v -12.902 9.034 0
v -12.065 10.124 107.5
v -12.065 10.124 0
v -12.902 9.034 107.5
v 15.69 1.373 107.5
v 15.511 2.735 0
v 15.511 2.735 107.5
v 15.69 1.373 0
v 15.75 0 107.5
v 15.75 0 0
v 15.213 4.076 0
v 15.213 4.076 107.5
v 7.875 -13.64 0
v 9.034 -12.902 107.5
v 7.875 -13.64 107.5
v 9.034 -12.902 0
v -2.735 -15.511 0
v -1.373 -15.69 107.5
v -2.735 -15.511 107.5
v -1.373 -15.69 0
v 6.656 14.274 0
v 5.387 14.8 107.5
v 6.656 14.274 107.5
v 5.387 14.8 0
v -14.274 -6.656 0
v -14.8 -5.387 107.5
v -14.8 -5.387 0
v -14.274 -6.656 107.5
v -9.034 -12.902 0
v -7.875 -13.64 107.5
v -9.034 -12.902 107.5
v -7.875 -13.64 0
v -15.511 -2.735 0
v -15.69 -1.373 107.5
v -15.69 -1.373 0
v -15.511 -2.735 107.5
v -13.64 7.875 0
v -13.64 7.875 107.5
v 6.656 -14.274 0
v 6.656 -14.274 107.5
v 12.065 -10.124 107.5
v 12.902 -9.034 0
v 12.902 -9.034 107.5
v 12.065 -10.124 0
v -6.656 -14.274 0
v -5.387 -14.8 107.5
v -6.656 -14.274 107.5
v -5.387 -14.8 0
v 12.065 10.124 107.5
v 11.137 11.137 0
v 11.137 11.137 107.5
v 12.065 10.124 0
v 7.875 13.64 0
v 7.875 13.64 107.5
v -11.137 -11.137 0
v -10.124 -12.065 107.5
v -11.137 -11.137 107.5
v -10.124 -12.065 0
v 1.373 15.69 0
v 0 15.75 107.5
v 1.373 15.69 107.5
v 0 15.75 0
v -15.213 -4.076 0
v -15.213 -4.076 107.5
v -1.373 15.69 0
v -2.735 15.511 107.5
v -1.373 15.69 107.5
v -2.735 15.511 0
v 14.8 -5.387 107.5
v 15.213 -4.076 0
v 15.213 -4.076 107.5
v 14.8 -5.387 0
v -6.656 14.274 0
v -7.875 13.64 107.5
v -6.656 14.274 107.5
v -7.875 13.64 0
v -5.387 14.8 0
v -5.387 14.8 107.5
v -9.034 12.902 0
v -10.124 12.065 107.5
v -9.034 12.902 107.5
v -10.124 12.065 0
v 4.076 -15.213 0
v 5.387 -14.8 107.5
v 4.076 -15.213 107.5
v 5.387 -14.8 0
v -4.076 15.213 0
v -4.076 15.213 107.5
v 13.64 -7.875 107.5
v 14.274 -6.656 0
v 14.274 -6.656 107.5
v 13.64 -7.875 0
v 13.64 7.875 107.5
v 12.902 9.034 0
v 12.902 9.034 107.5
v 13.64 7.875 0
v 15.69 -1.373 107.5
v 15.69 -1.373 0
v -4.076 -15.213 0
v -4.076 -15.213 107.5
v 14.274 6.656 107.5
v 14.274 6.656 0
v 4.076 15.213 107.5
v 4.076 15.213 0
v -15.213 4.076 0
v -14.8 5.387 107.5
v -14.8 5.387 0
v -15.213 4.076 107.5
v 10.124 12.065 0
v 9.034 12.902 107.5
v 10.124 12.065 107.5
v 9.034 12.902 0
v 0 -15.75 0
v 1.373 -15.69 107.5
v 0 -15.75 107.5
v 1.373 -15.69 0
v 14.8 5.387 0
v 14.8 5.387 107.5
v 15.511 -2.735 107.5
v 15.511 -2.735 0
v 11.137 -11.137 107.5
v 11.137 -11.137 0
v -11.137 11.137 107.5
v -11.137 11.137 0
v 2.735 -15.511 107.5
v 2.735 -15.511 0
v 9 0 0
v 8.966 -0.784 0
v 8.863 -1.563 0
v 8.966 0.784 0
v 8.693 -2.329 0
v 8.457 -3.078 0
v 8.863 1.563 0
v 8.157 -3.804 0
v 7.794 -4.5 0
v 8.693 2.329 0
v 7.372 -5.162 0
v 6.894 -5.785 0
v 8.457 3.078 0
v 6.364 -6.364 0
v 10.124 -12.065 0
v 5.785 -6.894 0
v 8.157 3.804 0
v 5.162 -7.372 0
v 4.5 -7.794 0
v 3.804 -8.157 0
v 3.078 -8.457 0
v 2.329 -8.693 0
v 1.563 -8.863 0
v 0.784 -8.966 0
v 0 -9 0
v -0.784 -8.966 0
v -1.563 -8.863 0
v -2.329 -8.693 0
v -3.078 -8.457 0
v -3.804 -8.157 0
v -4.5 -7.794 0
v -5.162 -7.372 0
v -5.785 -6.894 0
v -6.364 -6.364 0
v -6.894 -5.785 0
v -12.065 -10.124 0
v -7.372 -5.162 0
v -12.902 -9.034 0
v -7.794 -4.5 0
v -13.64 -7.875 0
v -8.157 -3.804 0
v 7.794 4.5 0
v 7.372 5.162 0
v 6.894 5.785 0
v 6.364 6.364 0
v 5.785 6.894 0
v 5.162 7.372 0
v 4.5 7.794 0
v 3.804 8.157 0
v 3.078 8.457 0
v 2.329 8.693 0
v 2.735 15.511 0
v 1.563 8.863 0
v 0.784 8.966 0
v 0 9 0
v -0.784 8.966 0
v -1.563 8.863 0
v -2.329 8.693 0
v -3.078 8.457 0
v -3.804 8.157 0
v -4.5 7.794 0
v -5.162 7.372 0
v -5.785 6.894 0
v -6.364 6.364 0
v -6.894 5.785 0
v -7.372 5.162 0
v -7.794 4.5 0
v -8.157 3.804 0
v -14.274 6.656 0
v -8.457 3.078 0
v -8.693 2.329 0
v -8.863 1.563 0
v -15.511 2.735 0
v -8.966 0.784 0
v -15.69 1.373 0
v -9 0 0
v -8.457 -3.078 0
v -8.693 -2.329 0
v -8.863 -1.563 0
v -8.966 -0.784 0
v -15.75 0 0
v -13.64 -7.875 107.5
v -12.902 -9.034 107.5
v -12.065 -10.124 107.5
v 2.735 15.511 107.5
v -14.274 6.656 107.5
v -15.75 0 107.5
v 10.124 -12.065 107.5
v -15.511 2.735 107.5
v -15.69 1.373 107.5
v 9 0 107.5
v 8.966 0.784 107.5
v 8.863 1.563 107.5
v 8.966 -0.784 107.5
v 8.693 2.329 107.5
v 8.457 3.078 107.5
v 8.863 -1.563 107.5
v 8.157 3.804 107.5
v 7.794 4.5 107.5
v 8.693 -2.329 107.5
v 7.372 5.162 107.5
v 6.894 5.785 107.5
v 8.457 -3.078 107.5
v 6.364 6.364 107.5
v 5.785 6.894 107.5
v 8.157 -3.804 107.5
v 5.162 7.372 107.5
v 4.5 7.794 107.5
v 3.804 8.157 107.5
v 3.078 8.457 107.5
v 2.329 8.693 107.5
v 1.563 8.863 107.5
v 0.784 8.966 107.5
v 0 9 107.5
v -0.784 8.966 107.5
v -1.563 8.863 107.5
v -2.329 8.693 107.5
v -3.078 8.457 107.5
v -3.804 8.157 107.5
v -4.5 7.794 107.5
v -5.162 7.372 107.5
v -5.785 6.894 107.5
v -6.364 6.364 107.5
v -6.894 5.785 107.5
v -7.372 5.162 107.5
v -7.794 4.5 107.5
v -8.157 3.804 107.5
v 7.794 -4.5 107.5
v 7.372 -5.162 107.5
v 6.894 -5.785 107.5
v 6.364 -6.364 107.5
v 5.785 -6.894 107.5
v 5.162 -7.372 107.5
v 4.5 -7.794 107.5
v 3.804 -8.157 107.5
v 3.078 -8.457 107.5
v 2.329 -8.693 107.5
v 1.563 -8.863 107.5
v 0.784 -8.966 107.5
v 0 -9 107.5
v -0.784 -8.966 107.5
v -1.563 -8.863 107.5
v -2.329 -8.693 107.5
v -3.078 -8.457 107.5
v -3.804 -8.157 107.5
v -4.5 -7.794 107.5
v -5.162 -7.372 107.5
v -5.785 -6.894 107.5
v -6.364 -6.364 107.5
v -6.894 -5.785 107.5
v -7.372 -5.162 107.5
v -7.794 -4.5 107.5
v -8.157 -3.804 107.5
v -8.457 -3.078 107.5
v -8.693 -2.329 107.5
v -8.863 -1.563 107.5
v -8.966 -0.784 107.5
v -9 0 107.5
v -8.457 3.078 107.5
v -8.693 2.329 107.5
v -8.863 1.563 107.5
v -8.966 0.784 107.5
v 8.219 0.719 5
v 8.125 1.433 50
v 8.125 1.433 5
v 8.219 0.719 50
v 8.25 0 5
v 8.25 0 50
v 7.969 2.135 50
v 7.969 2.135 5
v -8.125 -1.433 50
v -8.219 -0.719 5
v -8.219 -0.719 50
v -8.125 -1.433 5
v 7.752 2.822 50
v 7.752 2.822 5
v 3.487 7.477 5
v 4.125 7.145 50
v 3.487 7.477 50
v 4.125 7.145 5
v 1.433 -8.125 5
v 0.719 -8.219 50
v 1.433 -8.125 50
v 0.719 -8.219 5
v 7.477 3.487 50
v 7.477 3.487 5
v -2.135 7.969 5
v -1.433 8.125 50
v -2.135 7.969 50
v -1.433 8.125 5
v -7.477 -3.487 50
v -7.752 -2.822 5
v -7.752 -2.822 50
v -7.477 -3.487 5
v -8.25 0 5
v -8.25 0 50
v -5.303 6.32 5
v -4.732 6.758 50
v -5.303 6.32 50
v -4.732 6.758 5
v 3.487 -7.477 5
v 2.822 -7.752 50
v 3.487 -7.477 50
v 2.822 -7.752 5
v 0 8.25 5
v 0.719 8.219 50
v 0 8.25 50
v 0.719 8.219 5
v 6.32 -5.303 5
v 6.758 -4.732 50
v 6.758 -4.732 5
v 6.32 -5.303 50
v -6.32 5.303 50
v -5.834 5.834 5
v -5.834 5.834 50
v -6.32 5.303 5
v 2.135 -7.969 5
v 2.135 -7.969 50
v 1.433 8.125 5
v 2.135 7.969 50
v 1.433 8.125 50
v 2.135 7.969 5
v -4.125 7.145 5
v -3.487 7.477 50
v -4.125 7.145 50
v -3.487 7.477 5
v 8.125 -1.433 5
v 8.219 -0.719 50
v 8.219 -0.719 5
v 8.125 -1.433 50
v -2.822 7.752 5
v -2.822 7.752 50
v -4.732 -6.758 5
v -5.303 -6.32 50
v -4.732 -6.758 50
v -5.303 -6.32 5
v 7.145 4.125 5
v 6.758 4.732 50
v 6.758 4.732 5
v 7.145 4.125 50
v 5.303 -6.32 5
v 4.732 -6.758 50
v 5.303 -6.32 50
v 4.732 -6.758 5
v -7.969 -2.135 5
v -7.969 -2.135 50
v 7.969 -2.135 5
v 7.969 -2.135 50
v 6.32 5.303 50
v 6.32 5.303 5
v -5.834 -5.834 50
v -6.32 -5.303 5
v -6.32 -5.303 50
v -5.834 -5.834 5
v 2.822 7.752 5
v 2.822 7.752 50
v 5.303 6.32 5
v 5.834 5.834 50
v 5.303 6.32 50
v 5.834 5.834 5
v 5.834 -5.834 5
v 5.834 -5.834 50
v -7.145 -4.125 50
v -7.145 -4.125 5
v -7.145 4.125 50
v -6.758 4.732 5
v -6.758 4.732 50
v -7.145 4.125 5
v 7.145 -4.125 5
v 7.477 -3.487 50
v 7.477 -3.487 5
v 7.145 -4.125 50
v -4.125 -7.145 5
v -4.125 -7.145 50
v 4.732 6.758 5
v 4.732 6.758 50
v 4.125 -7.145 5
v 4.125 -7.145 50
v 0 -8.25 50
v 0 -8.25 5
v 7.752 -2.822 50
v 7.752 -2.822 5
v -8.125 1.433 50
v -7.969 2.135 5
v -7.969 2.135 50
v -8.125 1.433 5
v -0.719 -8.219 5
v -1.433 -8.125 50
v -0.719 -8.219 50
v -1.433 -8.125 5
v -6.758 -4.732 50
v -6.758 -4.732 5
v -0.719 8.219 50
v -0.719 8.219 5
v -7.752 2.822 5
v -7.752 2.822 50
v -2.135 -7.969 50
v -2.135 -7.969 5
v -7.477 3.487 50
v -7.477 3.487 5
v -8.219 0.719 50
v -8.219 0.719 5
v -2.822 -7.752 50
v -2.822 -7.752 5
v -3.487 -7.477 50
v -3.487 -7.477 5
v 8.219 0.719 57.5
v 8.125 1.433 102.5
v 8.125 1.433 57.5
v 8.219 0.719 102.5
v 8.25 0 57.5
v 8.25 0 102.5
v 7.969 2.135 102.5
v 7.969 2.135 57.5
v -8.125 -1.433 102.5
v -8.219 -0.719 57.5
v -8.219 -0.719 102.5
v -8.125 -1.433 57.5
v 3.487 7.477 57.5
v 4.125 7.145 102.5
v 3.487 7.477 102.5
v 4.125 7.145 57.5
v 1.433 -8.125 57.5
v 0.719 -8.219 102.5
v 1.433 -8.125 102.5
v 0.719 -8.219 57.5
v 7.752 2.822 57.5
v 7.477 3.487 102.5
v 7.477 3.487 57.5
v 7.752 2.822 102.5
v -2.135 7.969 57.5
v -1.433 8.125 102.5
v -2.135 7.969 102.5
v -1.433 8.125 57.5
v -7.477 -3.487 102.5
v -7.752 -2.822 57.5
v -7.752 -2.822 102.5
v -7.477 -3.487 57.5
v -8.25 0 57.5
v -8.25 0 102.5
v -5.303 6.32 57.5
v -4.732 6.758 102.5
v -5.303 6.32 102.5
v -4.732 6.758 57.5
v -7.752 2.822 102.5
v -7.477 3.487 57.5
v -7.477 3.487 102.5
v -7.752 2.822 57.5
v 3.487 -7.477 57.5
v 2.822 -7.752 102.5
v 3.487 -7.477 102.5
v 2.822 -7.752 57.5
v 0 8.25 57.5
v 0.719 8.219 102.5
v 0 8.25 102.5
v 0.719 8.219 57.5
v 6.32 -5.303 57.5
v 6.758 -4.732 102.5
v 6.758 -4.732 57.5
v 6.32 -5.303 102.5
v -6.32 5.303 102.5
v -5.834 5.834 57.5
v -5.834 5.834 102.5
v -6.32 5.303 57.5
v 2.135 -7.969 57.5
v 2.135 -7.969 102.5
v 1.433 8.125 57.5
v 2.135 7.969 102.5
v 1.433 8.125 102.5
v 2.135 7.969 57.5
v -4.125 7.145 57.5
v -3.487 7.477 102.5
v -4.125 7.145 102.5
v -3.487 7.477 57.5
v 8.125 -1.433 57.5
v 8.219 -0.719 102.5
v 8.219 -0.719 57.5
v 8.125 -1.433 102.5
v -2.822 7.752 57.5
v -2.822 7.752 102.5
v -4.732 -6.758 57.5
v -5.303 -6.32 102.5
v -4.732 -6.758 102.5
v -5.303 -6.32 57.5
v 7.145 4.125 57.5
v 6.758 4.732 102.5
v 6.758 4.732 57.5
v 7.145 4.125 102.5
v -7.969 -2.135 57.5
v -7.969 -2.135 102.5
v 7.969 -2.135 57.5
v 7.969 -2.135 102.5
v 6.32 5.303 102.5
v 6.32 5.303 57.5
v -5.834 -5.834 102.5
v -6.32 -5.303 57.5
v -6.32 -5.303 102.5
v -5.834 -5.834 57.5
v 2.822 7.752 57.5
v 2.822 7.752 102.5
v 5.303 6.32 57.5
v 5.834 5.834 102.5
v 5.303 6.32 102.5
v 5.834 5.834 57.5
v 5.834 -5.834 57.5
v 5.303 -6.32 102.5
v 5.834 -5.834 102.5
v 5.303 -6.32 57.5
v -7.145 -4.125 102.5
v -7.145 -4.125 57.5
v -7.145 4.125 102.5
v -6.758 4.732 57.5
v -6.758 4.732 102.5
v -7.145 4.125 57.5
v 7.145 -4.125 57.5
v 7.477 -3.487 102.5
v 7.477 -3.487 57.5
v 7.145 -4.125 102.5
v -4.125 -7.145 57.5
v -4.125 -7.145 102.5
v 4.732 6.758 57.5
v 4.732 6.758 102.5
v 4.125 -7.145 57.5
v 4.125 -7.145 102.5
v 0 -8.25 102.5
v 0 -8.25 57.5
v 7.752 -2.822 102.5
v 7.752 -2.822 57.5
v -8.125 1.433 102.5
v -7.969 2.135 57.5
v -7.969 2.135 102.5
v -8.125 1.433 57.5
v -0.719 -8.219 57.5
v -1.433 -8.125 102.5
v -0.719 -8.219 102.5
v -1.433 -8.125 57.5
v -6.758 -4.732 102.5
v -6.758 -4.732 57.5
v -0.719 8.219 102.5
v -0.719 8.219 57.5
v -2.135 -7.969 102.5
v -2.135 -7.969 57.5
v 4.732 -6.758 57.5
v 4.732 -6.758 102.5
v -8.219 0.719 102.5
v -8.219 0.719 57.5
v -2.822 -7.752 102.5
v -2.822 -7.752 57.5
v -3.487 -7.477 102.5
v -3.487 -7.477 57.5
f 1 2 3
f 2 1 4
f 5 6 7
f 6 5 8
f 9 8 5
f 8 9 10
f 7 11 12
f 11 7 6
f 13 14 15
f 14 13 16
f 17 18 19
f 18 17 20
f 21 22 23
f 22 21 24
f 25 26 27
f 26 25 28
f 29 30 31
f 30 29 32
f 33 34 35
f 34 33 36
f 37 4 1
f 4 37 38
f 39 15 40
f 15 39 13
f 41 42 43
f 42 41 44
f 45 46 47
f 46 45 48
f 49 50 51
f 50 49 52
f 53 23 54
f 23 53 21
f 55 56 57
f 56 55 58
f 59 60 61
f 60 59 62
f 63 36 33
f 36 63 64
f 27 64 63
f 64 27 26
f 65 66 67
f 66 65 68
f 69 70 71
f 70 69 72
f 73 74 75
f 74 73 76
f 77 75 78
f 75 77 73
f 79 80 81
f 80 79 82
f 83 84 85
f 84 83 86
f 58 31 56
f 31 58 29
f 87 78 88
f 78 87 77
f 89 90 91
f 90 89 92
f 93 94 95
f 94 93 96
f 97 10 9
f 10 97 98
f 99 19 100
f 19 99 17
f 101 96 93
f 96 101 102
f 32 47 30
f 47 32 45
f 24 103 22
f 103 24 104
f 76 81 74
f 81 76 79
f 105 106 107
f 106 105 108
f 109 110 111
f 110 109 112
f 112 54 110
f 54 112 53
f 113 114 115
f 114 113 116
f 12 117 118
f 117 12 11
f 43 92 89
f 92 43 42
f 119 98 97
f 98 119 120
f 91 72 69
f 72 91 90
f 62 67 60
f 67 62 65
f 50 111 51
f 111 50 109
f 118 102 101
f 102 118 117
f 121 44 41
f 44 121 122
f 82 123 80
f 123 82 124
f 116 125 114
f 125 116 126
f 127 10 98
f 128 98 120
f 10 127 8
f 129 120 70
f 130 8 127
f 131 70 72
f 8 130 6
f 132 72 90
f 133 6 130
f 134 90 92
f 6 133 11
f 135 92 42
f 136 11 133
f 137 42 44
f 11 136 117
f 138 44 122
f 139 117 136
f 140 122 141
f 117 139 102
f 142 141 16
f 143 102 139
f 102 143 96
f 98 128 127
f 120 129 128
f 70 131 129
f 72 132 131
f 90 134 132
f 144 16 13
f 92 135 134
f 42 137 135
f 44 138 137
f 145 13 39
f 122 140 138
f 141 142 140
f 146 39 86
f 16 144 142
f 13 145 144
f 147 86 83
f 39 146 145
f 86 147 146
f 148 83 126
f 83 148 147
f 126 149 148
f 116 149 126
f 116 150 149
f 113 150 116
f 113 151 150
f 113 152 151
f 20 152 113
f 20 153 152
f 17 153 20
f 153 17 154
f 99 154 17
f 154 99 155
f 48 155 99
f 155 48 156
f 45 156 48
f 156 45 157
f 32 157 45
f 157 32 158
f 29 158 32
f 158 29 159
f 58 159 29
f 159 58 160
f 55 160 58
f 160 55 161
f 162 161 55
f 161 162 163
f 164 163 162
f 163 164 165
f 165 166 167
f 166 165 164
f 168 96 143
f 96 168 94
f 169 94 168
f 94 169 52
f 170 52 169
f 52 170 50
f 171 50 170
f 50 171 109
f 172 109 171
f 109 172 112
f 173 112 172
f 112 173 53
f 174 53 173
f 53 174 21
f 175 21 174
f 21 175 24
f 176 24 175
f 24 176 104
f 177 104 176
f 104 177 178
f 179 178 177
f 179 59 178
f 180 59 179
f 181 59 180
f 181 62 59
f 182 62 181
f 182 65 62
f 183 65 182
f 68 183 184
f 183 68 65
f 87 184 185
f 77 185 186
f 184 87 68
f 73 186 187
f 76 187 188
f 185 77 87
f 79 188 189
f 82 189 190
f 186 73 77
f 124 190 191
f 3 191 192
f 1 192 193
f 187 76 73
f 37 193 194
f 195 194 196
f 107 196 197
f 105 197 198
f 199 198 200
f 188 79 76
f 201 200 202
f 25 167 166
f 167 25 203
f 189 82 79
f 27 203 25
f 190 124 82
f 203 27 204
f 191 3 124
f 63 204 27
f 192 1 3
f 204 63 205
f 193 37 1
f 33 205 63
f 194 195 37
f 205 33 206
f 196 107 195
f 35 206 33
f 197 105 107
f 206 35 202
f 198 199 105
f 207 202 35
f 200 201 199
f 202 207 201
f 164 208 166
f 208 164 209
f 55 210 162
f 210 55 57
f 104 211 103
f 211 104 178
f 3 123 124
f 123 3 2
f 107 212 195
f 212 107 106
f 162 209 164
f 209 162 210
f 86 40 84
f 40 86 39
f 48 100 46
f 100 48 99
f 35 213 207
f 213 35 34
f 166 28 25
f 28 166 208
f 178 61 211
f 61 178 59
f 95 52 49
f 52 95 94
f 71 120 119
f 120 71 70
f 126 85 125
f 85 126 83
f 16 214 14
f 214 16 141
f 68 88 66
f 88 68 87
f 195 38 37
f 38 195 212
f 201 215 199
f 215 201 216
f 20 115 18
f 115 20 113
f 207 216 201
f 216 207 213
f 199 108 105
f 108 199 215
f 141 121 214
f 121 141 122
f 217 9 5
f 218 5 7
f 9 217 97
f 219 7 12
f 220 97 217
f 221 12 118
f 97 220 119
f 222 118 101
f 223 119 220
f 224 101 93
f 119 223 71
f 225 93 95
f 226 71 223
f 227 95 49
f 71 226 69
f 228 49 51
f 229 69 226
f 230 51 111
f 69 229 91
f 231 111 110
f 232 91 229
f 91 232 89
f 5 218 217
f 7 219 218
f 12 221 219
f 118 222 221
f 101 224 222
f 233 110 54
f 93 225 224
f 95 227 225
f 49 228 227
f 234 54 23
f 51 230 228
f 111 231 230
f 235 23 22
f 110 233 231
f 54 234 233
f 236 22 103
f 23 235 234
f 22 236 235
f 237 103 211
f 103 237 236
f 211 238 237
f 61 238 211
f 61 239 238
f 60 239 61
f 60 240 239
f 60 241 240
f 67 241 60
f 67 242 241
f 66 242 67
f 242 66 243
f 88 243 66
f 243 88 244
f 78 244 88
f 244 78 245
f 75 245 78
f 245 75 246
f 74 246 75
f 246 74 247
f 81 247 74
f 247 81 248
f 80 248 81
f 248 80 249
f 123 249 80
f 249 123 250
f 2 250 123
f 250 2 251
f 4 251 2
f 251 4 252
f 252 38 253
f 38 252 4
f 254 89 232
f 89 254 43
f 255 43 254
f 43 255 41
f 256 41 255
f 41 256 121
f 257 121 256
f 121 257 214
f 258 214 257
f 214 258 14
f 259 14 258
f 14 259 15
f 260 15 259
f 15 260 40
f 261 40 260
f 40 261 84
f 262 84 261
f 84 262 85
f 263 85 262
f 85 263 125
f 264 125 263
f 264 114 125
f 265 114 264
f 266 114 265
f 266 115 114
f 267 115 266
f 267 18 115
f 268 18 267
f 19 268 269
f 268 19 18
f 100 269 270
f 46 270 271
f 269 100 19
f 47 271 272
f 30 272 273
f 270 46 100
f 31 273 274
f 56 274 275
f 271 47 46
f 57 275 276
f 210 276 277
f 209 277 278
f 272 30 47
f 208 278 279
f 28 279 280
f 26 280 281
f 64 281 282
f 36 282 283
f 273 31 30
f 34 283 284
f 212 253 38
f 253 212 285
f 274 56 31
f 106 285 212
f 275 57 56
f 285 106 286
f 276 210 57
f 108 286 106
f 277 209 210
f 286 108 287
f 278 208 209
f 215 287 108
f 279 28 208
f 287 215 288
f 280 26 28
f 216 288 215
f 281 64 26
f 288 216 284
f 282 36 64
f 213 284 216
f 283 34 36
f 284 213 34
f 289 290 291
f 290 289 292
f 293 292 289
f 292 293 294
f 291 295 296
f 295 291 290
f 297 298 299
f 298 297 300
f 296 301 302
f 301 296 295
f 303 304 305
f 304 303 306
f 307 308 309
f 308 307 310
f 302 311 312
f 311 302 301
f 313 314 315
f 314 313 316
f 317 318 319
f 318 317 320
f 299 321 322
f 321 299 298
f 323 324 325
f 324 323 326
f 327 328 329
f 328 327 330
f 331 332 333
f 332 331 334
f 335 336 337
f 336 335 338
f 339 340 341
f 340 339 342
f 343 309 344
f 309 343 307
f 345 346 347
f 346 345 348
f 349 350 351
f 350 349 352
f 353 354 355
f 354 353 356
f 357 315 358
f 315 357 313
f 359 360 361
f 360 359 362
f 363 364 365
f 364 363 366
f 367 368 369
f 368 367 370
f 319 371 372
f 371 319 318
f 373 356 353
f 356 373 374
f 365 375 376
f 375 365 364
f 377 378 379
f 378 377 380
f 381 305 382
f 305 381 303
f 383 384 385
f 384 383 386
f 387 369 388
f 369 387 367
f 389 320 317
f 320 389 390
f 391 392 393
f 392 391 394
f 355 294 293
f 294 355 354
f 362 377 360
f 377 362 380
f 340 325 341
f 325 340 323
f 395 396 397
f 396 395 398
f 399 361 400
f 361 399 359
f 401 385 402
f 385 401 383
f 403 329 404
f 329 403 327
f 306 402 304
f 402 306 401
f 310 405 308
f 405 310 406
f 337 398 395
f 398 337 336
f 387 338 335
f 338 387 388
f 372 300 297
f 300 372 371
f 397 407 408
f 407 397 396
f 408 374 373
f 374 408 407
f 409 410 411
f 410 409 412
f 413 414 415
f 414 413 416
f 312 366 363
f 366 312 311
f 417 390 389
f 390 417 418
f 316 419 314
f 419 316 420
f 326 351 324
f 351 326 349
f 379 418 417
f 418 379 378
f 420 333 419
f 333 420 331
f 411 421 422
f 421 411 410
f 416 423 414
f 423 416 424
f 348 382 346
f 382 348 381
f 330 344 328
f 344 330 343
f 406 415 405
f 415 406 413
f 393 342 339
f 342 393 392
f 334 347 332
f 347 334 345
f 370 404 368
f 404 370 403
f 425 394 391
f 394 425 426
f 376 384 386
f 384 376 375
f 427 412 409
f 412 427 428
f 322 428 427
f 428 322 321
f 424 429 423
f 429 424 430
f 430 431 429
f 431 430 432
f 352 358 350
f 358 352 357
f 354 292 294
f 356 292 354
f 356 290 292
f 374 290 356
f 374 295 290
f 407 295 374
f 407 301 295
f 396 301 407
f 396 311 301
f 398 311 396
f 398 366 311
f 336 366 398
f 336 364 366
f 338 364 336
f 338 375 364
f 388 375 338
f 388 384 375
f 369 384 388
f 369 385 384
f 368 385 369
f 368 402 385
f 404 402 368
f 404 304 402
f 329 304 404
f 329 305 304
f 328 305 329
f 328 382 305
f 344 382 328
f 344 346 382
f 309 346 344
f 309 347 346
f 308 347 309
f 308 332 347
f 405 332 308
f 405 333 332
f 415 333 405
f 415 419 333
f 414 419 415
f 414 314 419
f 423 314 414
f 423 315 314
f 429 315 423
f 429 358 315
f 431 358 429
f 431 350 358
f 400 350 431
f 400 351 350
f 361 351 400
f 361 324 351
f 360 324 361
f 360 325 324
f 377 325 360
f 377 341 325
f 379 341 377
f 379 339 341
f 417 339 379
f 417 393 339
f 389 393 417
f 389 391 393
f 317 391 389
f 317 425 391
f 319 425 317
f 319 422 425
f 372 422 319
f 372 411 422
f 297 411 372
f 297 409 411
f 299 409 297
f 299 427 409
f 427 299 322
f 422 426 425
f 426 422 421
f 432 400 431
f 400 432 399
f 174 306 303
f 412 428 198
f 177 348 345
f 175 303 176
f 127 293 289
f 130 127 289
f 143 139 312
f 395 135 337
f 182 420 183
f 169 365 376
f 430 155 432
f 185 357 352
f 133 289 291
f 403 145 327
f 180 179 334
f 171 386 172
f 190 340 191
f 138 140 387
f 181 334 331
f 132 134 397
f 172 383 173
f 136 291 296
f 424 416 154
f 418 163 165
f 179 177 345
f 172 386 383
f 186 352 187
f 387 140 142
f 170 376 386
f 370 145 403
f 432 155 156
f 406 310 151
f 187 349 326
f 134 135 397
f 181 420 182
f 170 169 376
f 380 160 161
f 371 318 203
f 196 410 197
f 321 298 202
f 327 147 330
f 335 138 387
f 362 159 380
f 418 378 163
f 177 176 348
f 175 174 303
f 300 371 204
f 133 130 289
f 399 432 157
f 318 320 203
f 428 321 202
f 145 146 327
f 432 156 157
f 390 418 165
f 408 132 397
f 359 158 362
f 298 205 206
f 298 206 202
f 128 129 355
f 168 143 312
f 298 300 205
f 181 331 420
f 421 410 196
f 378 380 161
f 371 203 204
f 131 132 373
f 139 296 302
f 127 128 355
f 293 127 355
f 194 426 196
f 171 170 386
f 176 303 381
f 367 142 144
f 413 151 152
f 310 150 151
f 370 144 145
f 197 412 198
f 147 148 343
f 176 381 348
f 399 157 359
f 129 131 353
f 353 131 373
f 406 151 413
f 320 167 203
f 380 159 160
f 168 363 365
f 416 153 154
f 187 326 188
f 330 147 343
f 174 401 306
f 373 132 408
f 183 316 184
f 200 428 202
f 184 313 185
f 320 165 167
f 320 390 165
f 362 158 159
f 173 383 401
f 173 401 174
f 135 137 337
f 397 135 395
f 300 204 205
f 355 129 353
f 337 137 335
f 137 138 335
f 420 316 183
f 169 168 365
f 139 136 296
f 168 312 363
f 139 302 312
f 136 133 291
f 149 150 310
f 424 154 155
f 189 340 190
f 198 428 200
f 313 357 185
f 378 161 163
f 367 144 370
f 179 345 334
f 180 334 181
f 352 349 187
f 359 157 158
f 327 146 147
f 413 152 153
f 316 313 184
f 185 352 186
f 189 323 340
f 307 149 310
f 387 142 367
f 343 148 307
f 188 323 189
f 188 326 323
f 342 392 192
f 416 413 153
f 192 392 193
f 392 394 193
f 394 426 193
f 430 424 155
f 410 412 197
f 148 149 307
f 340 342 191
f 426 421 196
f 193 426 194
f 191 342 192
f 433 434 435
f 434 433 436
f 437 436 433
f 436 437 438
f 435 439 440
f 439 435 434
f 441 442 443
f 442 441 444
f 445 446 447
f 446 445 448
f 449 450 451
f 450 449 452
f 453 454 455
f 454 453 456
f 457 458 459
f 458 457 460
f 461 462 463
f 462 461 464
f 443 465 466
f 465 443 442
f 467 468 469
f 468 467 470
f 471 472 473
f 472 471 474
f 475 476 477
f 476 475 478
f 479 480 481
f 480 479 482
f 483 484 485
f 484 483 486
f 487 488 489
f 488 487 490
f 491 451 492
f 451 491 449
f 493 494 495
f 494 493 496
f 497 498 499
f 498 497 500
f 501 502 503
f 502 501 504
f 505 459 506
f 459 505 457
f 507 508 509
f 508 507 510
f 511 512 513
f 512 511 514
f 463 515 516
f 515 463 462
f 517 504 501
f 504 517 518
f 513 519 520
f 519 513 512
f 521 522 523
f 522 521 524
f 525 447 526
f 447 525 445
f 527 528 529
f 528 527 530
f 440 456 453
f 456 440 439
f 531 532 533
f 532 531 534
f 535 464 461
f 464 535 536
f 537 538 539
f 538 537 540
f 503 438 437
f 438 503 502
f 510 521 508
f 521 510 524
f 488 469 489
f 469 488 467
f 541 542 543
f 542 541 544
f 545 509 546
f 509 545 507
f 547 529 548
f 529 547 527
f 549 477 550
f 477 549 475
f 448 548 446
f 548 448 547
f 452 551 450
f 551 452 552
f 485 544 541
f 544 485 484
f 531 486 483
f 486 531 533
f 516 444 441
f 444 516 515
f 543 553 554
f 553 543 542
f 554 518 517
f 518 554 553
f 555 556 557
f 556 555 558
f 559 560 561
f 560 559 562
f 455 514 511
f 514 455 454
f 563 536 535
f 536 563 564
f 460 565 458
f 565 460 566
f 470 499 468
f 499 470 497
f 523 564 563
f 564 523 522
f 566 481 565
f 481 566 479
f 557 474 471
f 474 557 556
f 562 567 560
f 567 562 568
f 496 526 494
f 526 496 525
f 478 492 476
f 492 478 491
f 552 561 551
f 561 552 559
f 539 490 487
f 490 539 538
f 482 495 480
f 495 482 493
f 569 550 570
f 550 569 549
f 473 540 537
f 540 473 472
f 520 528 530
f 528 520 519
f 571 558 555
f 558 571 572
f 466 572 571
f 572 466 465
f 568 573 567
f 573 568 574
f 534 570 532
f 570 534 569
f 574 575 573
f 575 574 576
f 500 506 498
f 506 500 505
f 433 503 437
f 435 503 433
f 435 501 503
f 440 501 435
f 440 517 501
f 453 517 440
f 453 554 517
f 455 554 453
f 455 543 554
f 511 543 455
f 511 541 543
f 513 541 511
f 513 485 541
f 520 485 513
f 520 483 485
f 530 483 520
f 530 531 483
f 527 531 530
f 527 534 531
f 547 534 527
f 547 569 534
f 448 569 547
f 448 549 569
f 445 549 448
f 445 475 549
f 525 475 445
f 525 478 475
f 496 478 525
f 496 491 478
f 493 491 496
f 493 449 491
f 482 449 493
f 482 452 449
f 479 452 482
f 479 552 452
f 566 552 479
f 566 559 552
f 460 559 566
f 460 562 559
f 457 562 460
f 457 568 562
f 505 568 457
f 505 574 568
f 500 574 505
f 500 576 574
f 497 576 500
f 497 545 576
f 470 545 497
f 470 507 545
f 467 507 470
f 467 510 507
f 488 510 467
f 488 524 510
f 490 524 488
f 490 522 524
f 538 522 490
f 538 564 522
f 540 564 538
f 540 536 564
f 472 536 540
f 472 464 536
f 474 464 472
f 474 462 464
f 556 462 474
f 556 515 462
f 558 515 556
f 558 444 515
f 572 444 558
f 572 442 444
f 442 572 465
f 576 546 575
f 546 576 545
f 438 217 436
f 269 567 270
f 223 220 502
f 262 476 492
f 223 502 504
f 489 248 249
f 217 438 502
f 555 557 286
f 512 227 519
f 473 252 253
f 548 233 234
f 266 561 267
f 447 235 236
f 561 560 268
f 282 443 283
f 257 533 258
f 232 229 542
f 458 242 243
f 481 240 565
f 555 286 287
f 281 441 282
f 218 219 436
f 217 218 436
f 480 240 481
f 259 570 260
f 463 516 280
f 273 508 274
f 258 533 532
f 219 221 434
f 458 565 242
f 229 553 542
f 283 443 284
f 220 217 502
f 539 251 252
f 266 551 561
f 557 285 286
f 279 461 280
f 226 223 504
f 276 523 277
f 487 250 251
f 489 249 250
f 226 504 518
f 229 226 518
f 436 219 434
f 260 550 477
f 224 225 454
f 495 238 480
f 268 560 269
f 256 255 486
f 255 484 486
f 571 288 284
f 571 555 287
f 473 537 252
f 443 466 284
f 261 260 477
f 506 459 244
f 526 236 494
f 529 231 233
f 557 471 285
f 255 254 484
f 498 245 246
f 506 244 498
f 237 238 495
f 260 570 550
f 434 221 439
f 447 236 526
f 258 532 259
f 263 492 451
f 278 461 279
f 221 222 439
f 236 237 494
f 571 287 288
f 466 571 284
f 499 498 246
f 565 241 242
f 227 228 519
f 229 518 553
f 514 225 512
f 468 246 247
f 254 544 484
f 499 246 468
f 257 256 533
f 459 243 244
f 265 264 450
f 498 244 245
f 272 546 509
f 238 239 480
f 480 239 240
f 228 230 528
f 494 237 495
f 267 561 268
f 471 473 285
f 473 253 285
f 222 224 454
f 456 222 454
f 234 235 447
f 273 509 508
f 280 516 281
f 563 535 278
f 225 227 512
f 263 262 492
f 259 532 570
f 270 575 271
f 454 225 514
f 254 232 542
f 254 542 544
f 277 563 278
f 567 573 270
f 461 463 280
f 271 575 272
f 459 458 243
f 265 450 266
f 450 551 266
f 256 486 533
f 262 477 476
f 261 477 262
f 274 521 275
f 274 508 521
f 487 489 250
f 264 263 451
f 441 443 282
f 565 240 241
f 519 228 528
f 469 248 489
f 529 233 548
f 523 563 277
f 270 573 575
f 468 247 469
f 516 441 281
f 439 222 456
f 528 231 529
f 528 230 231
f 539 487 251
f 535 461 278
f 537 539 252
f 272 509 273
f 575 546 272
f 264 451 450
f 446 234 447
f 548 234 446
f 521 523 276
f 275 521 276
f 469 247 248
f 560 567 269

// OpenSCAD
// file: measurements.scad
// The thickness of any walls (e.g. the difference between the inner and outer radiuses of a tube retainer).
thickness_mm = 7.5;

// The tube which spaces apart the VESA mount and the Kinect mount.
////////////////////////////////////////////////////////////////////////////////

// The diameter of the narrowest part of the tube's retainer.
tube_retainer_diameter_mm = 16.5;

// The total length of the tube's retainer.
tube_retainer_length_mm = 50;

// The diameter of the widest part of the tube's retainer.
tube_feed_diameter_mm = 18;

// The length of the transition between the widest and narrowest parts of the
// tube's retainer.
tube_feed_length_mm = 5;

// The number of sides on the tube's retainer.
tube_sides = 72;

// Additional radius added where a tube mounting meets a surface.
tube_widening_mm = 10;

// Kinect for Xbox 360.
////////////////////////////////////////////////////////////////////////////////

// The length of the Kinect's base.
kinect_length_mm = 75;

// The width of the bottom of the Kinect's base.
kinect_lower_width_mm = 81;

// The thickness of the base below the Kinect.
kinect_base_height_mm = 2;

// The width of the middle of the Kinect's base (its widest point).
kinect_middle_width_mm = 88.5;

// The distance between the bottom of the Kinect's base and its widest point.
kinect_lower_height_mm = 13;

// The width of the top of the Kinect's base.
kinect_top_width_mm = 80;

// The distance between the widest point of the Kinect's base and the top of the
// retainer.
kinect_upper_height_mm = 5;

// The thickness of the Kinect's retainer.
kinect_clip_thickness_mm = 2;

// The diameter of the head of the M3 screw used to secure the Kinect.
kinect_screw_head_diameter_mm = 7;

// The diameter of the hole required by the M3 screw used to secure the Kinect.
kinect_screw_hole_diameter_mm = 2.95;

// The number of sides of the head of or the hole required by the M3 screw used
// to secure the Kinect.
kinect_screw_sides = 24;

// The distance between the Kinect's front and back screw holes.
kinect_screw_y_spacing_mm = 19.25;

// The distance between the Kinect's left and right screw holes.
kinect_screw_x_spacing_mm = 68.5;

// The space which must be clear behind a Kinect for cable routing.
kinect_cable_spacing_mm = 15;

// The MALM push-fit bracket.
////////////////////////////////////////////////////////////////////////////////

// The thickness of the desk.
malm_height_mm = 50.5;

// The length of the fingers which push onto the desk.  Increase to improve
// pitch stability.
malm_length_mm = 70;

// The width of the fingers which push onto the desk.  Increase to improve roll
// stability.
malm_width_mm = 60;
// main file
include <measurements.scad>

difference() {
    cylinder(
        d = tube_retainer_diameter_mm + thickness_mm * 2,
        h = tube_retainer_length_mm * 2 + thickness_mm,
        $fn = tube_sides
    );

    cylinder(
        d = tube_retainer_diameter_mm,
        h = tube_retainer_length_mm,
        $fn = tube_sides
    );

    cylinder(
        d1 = tube_feed_diameter_mm,
        d2 = tube_retainer_diameter_mm,
        h = tube_feed_length_mm,
        $fn = tube_sides
    );

    translate([0, 0, tube_retainer_length_mm + thickness_mm]) {
        cylinder(
            d = tube_retainer_diameter_mm,
            h = tube_retainer_length_mm,
            $fn = tube_sides
        );
    };

    translate([0, 0, tube_retainer_length_mm * 2 + thickness_mm - tube_feed_length_mm]) {
        cylinder(
            d1 = tube_retainer_diameter_mm,
            d2 = tube_feed_diameter_mm,
            h = tube_feed_length_mm,
            $fn = tube_sides
        );
    };
};
